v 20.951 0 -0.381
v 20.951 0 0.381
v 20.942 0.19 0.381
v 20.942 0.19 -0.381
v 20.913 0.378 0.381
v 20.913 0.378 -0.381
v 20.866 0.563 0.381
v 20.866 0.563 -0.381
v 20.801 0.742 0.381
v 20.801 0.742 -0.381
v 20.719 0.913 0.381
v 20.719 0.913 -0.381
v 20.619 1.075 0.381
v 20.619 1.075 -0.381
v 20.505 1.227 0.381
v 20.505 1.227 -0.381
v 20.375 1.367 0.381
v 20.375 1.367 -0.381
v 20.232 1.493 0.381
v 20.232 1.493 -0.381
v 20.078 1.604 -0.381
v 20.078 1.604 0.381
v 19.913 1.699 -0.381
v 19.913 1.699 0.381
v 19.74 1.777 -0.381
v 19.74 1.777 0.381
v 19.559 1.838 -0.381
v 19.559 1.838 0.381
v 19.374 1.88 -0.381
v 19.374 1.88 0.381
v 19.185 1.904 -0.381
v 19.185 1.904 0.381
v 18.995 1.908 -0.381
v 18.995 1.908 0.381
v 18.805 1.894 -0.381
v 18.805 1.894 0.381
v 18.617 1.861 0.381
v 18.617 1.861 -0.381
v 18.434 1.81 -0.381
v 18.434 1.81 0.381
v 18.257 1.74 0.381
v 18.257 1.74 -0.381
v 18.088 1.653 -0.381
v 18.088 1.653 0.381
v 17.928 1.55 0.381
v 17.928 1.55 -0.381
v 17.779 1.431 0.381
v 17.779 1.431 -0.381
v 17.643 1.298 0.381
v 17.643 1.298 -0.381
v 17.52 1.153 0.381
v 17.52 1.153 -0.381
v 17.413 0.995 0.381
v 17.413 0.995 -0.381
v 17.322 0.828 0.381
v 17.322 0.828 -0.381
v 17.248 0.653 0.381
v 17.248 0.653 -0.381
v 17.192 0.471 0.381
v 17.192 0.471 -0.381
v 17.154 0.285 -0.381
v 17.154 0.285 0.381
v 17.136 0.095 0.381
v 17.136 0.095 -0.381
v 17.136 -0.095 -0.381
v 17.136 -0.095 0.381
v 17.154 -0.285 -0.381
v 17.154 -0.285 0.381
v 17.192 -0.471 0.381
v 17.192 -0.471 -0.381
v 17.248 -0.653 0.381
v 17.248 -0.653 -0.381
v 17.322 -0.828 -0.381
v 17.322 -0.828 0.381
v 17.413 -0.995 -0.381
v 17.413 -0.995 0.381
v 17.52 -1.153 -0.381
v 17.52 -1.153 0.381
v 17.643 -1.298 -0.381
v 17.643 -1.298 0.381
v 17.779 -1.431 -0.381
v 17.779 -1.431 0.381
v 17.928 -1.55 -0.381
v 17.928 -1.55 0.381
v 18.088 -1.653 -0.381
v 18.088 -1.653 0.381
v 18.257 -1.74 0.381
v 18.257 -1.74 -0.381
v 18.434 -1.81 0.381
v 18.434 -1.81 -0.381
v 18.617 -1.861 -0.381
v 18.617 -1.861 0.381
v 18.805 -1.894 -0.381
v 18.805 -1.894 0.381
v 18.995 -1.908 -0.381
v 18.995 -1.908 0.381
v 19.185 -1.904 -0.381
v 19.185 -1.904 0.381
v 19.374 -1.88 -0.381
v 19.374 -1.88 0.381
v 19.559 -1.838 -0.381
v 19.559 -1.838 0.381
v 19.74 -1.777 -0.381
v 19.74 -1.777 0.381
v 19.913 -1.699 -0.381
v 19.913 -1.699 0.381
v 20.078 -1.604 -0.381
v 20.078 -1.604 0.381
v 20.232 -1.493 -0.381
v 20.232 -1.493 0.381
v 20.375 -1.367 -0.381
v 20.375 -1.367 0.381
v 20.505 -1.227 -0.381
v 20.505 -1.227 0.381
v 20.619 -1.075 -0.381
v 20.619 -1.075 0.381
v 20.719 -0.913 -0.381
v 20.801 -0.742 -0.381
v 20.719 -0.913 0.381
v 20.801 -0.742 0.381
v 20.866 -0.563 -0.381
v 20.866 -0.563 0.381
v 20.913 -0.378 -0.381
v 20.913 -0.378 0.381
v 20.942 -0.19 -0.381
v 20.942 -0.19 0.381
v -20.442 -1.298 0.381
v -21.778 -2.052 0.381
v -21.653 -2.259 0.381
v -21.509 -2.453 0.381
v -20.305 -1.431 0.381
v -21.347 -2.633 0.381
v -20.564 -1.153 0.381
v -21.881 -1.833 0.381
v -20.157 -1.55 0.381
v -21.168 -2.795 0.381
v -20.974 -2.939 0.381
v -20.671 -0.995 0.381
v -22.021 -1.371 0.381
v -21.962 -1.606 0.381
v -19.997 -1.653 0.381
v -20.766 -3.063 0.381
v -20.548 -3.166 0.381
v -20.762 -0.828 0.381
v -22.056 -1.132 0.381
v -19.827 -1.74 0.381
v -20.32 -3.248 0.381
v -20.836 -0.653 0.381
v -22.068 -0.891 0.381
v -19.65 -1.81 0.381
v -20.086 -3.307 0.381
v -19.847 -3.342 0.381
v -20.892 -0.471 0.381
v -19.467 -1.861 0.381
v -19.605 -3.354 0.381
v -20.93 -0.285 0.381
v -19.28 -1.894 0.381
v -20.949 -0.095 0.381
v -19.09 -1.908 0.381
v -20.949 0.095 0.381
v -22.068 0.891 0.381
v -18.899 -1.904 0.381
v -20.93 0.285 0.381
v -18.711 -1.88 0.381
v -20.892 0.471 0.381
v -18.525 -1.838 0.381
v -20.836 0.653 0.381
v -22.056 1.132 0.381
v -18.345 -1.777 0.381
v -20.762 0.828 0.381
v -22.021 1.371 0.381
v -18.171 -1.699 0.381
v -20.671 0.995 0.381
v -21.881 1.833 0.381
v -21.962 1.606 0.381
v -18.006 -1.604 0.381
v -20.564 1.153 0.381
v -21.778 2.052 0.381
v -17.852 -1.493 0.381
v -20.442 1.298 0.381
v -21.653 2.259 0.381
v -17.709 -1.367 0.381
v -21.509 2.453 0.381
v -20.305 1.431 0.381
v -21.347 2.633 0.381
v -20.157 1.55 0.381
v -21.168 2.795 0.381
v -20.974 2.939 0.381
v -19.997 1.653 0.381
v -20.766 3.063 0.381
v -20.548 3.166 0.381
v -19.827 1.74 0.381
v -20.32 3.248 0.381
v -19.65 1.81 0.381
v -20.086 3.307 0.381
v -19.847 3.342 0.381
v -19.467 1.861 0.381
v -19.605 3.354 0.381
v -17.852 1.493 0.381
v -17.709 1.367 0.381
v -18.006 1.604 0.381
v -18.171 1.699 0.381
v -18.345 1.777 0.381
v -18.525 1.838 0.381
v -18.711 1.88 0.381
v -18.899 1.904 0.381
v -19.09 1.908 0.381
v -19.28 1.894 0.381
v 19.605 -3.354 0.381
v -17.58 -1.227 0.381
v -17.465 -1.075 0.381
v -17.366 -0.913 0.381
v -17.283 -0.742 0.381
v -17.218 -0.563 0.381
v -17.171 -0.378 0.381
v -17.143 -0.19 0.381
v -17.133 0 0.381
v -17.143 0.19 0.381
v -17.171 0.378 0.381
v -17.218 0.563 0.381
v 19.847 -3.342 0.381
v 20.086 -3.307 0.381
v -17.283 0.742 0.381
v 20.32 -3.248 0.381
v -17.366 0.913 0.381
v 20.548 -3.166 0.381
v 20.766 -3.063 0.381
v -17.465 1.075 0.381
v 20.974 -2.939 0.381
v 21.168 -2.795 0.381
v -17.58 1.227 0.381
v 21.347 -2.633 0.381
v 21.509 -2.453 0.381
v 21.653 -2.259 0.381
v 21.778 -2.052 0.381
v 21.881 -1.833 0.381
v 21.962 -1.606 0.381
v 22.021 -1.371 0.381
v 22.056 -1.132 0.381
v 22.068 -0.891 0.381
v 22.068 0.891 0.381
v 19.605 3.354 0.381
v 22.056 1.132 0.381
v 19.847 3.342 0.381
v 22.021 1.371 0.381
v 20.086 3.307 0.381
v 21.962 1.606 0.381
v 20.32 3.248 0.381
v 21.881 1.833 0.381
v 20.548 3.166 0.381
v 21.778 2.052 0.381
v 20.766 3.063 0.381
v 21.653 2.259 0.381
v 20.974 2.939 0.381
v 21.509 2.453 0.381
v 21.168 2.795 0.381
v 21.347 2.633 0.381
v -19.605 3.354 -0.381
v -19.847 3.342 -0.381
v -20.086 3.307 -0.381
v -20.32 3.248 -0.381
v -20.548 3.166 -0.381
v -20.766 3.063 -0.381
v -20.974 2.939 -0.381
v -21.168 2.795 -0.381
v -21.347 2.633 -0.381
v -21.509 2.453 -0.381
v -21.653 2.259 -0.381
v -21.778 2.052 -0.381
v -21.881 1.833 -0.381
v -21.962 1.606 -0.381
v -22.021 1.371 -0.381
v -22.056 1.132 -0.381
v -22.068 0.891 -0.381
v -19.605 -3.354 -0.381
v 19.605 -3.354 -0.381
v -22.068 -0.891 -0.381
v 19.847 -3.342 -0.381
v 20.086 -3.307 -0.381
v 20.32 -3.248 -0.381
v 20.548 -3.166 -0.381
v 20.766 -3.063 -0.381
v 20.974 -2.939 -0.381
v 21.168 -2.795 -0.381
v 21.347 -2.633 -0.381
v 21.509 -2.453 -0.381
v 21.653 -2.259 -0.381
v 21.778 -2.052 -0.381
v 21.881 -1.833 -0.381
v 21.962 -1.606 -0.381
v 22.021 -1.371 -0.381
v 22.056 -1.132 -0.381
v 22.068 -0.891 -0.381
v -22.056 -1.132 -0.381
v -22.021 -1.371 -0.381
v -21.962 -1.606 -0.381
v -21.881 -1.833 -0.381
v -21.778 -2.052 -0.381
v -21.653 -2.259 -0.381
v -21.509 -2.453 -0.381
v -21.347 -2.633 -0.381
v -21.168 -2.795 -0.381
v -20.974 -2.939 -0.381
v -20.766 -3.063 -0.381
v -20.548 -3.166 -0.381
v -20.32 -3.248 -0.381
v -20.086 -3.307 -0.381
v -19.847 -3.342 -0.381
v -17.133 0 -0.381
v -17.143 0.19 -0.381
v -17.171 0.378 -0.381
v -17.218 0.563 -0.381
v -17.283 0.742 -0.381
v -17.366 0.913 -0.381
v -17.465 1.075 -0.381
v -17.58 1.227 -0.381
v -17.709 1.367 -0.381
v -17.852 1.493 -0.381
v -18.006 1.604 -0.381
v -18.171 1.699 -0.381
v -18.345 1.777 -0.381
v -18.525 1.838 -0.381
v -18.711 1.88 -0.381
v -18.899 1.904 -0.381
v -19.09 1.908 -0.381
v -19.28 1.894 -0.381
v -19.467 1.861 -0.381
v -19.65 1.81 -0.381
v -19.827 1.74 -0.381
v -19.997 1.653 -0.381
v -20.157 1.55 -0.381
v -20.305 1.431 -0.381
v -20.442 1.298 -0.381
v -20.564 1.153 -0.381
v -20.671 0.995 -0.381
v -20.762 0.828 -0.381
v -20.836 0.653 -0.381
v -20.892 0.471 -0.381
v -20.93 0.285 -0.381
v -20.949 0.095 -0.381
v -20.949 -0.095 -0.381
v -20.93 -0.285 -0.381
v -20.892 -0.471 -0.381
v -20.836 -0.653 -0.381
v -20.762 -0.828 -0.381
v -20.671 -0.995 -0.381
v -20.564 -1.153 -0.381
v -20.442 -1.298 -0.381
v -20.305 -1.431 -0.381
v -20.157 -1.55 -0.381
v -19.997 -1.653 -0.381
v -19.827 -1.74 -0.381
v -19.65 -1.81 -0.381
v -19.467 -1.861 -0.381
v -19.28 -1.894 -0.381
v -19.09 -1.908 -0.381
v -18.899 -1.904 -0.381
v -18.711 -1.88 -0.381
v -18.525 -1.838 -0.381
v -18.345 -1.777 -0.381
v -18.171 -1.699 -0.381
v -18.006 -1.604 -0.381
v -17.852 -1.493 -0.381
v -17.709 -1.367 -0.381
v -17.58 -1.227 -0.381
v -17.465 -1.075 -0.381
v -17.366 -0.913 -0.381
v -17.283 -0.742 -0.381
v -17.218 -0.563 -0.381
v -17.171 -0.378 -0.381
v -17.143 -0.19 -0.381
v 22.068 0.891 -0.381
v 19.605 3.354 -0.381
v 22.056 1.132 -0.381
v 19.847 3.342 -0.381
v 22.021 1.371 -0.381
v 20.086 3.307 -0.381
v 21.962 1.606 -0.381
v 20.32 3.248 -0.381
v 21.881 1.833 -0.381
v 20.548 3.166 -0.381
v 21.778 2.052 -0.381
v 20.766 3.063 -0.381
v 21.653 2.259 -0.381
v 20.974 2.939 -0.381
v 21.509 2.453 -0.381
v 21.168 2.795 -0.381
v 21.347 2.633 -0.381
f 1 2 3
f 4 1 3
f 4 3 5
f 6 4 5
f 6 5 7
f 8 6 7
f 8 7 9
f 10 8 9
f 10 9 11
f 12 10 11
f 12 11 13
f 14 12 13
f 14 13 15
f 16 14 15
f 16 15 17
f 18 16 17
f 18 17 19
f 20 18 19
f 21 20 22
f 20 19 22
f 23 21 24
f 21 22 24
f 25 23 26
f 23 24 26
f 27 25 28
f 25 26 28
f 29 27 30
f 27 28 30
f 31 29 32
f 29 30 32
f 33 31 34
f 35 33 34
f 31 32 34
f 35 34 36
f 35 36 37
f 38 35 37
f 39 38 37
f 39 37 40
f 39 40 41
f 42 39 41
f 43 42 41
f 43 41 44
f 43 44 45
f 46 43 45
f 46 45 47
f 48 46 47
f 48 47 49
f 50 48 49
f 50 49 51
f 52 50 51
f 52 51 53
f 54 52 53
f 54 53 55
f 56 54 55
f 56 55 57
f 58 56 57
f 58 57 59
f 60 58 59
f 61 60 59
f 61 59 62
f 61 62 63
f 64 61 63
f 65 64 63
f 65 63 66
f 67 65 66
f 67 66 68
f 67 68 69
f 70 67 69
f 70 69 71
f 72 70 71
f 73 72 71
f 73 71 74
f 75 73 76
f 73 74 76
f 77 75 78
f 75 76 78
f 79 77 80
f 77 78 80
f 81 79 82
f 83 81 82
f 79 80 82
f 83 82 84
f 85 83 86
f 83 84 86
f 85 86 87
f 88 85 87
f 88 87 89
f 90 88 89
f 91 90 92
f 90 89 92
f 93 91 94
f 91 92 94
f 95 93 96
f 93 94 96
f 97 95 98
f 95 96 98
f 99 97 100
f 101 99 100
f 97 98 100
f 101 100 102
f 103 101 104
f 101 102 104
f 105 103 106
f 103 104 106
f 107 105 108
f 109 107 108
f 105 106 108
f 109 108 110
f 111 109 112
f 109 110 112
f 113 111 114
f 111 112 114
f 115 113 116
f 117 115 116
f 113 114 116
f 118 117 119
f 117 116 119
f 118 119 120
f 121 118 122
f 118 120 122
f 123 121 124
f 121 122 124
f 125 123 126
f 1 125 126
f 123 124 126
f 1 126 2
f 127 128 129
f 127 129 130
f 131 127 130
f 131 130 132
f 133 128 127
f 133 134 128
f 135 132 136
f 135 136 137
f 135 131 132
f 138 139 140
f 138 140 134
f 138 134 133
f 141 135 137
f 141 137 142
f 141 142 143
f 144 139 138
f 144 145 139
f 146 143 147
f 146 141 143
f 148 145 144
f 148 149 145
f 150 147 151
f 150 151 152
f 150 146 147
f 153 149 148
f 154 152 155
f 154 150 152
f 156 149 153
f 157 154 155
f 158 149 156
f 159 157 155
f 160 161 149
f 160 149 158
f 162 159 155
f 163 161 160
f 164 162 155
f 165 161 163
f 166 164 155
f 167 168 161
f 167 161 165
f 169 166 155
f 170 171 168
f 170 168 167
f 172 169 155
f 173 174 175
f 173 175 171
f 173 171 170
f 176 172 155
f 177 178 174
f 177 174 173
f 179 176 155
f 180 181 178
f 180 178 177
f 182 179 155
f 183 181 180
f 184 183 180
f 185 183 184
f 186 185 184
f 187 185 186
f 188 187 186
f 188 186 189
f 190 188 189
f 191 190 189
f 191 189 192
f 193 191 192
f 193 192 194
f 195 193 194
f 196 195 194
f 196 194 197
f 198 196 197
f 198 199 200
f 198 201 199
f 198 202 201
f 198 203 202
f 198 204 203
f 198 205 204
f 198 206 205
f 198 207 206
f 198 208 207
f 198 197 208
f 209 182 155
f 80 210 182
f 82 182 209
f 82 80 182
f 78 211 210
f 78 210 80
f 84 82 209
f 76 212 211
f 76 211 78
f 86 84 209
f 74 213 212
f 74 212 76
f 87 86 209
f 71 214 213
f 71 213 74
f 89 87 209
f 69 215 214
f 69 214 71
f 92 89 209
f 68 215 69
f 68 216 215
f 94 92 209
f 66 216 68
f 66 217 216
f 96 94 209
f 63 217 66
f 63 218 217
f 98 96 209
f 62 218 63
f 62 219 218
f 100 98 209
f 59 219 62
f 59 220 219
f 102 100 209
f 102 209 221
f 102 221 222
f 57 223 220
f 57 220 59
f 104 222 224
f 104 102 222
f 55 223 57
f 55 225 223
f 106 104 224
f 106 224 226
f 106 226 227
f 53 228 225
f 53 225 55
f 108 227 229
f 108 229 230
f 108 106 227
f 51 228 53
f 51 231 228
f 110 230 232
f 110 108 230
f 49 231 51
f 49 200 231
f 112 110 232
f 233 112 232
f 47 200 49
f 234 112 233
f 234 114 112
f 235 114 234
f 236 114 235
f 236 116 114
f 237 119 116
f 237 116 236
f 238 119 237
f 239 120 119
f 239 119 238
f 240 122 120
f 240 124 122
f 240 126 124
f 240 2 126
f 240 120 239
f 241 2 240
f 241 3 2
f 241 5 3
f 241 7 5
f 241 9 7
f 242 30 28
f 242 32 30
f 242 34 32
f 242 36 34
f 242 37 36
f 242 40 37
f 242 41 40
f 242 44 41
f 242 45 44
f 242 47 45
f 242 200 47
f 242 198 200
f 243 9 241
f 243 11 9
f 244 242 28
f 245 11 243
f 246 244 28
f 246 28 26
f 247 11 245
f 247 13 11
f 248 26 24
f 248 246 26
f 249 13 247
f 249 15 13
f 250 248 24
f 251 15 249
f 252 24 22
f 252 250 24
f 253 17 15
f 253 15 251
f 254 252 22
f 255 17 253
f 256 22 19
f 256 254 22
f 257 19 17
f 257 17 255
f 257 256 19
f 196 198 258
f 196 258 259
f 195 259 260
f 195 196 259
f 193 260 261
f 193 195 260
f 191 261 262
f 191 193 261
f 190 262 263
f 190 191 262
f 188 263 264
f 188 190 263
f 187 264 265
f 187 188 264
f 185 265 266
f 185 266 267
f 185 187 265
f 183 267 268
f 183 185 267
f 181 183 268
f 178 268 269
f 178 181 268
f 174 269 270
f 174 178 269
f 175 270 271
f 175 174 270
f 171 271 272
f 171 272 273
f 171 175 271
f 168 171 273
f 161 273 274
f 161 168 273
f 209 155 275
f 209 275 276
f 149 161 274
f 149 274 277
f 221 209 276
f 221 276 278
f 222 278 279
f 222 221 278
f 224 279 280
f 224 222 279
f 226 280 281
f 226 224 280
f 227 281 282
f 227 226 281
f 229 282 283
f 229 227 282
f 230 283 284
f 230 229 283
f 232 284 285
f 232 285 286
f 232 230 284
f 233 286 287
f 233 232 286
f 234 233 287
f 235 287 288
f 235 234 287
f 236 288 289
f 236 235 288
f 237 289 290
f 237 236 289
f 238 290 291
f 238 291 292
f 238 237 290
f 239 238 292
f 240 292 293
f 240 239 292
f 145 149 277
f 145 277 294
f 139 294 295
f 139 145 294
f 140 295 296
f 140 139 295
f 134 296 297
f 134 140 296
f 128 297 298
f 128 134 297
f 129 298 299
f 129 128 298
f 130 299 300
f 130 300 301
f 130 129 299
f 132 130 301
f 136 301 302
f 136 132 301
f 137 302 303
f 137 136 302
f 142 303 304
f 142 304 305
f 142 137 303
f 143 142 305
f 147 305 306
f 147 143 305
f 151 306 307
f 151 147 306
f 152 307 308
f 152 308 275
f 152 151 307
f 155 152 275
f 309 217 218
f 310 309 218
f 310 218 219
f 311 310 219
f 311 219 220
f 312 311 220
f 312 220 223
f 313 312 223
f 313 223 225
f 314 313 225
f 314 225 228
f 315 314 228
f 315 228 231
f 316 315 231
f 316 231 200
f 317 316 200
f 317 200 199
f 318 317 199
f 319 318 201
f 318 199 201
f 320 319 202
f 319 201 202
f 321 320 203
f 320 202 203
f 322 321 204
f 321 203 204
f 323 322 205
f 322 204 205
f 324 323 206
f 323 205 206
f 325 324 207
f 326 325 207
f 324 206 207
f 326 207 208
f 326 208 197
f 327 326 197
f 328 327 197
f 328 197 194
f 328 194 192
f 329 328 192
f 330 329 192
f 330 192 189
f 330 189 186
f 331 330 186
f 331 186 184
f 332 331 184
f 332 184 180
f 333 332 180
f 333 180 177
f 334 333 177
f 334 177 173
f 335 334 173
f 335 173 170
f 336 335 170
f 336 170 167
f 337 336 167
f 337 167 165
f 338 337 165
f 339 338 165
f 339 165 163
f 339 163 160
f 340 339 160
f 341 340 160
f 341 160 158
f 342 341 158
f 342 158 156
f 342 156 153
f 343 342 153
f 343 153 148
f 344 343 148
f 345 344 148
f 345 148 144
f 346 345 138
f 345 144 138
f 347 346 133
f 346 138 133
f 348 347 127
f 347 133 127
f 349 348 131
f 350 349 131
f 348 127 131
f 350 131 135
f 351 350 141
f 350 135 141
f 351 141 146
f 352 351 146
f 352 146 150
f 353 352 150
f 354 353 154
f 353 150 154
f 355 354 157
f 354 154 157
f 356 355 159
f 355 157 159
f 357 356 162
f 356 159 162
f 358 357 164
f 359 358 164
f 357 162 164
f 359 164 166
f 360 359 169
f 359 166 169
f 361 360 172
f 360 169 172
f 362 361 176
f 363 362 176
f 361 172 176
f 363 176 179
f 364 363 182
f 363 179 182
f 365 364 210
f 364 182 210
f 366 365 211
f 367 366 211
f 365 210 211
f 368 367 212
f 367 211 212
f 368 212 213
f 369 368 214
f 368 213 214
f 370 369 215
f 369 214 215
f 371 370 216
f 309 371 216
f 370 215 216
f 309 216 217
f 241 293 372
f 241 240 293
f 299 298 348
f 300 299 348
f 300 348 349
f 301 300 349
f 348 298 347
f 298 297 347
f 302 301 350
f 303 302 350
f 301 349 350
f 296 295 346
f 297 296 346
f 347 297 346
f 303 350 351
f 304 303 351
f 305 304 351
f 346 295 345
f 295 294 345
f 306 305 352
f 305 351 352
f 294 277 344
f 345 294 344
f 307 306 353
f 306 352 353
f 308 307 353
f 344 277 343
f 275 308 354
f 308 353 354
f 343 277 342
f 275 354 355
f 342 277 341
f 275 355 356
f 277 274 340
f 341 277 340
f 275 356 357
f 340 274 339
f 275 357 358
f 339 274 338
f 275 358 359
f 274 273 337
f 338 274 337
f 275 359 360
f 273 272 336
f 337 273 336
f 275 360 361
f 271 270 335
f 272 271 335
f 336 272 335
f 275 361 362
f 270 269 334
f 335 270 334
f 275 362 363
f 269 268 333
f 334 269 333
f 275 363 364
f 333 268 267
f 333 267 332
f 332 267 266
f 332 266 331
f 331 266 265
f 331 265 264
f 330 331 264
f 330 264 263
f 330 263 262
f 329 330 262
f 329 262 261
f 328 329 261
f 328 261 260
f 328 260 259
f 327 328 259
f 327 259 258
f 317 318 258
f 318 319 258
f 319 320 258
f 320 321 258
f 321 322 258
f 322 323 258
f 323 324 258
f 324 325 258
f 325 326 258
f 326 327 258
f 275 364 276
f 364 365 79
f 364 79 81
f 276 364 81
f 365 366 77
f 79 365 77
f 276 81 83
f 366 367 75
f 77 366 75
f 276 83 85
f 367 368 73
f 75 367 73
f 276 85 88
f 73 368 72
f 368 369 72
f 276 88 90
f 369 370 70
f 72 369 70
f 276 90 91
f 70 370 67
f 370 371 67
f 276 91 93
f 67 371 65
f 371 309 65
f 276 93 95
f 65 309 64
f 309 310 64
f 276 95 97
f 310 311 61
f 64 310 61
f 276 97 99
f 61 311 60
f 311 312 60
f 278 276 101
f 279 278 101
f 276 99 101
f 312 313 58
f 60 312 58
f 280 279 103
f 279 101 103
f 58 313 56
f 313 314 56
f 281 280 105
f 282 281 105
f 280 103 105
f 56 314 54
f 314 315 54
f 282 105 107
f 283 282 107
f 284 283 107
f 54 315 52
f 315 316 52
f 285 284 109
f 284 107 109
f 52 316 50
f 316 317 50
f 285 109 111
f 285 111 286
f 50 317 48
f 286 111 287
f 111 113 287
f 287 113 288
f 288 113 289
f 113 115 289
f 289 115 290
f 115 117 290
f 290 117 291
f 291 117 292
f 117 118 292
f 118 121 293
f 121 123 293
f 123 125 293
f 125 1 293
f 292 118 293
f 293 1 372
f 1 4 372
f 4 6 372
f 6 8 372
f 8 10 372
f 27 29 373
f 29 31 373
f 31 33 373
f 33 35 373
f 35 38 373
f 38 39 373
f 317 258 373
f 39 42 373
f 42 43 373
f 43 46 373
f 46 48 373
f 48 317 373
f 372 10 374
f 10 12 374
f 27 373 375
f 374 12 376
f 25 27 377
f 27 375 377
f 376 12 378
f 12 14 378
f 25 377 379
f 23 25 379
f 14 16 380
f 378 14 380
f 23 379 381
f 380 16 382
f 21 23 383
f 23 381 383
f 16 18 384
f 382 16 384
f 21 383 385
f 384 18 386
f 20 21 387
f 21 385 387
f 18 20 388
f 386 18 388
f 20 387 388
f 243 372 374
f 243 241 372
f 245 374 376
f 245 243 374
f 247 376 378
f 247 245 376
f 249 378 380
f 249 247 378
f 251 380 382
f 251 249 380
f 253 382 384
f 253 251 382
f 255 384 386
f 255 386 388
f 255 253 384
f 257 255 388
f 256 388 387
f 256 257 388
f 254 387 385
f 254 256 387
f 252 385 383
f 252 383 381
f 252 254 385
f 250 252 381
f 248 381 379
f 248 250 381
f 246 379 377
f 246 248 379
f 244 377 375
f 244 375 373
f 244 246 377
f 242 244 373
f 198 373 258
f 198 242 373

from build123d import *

# Parameters (mm, degrees)
F1_DEPTH      = 0.381
F1_DEPTH_BACK = 0.381
F2_R          = 1.908991
F3_DEPTH      = 1.27
F3_DEPTH_BACK = 0.6858
F4_DEPTH      = 0.9398
F4_DEPTH_BACK = 1.8034


with BuildPart() as f1:
    # F0 (on Top) → F1 (new body, two sides)
    with BuildSketch(Plane.XY) as f1_sk:
        with BuildLine():
            Line((19.605453, 3.353871), (-19.605453, 3.353871))
            ThreePointArc((-19.605453, 3.353871), (-21.346986, 2.632504), (-22.068353, 0.89097))
            Line((-22.068353, 0.89097), (-22.068353, -0.89097))
            ThreePointArc((-22.068353, -0.89097), (-21.346986, -2.632504), (-19.605453, -3.353871))
            Line((-19.605453, -3.353871), (19.605453, -3.353871))
            ThreePointArc((19.605453, -3.353871), (21.346986, -2.632504), (22.068353, -0.89097))
            Line((22.068353, -0.89097), (22.068353, 0.89097))
            ThreePointArc((22.068353, 0.89097), (21.346986, 2.632504), (19.605453, 3.353871))
        make_face()
    extrude(amount=F1_DEPTH)
    extrude(f1_sk.sketch, amount=-F1_DEPTH_BACK)

    # F2 (on face) → F3 (cut, two sides)
    with BuildSketch(Plane.XY.offset(0.381)) as f3_sk:
        with Locations((-19.042145, 0)):
            Circle(F2_R)
    extrude(amount=-F3_DEPTH, mode=Mode.SUBTRACT)
    extrude(f3_sk.sketch, amount=-F3_DEPTH_BACK, mode=Mode.SUBTRACT)

    # F2 (on face) → F4 (cut, two sides)
    with BuildSketch(Plane.XY.offset(0.381)) as f4_sk:
        with Locations((19.042145, 0)):
            Circle(F2_R)
    extrude(amount=F4_DEPTH, mode=Mode.SUBTRACT)
    extrude(f4_sk.sketch, amount=-F4_DEPTH_BACK, mode=Mode.SUBTRACT)


solid = f1.part
